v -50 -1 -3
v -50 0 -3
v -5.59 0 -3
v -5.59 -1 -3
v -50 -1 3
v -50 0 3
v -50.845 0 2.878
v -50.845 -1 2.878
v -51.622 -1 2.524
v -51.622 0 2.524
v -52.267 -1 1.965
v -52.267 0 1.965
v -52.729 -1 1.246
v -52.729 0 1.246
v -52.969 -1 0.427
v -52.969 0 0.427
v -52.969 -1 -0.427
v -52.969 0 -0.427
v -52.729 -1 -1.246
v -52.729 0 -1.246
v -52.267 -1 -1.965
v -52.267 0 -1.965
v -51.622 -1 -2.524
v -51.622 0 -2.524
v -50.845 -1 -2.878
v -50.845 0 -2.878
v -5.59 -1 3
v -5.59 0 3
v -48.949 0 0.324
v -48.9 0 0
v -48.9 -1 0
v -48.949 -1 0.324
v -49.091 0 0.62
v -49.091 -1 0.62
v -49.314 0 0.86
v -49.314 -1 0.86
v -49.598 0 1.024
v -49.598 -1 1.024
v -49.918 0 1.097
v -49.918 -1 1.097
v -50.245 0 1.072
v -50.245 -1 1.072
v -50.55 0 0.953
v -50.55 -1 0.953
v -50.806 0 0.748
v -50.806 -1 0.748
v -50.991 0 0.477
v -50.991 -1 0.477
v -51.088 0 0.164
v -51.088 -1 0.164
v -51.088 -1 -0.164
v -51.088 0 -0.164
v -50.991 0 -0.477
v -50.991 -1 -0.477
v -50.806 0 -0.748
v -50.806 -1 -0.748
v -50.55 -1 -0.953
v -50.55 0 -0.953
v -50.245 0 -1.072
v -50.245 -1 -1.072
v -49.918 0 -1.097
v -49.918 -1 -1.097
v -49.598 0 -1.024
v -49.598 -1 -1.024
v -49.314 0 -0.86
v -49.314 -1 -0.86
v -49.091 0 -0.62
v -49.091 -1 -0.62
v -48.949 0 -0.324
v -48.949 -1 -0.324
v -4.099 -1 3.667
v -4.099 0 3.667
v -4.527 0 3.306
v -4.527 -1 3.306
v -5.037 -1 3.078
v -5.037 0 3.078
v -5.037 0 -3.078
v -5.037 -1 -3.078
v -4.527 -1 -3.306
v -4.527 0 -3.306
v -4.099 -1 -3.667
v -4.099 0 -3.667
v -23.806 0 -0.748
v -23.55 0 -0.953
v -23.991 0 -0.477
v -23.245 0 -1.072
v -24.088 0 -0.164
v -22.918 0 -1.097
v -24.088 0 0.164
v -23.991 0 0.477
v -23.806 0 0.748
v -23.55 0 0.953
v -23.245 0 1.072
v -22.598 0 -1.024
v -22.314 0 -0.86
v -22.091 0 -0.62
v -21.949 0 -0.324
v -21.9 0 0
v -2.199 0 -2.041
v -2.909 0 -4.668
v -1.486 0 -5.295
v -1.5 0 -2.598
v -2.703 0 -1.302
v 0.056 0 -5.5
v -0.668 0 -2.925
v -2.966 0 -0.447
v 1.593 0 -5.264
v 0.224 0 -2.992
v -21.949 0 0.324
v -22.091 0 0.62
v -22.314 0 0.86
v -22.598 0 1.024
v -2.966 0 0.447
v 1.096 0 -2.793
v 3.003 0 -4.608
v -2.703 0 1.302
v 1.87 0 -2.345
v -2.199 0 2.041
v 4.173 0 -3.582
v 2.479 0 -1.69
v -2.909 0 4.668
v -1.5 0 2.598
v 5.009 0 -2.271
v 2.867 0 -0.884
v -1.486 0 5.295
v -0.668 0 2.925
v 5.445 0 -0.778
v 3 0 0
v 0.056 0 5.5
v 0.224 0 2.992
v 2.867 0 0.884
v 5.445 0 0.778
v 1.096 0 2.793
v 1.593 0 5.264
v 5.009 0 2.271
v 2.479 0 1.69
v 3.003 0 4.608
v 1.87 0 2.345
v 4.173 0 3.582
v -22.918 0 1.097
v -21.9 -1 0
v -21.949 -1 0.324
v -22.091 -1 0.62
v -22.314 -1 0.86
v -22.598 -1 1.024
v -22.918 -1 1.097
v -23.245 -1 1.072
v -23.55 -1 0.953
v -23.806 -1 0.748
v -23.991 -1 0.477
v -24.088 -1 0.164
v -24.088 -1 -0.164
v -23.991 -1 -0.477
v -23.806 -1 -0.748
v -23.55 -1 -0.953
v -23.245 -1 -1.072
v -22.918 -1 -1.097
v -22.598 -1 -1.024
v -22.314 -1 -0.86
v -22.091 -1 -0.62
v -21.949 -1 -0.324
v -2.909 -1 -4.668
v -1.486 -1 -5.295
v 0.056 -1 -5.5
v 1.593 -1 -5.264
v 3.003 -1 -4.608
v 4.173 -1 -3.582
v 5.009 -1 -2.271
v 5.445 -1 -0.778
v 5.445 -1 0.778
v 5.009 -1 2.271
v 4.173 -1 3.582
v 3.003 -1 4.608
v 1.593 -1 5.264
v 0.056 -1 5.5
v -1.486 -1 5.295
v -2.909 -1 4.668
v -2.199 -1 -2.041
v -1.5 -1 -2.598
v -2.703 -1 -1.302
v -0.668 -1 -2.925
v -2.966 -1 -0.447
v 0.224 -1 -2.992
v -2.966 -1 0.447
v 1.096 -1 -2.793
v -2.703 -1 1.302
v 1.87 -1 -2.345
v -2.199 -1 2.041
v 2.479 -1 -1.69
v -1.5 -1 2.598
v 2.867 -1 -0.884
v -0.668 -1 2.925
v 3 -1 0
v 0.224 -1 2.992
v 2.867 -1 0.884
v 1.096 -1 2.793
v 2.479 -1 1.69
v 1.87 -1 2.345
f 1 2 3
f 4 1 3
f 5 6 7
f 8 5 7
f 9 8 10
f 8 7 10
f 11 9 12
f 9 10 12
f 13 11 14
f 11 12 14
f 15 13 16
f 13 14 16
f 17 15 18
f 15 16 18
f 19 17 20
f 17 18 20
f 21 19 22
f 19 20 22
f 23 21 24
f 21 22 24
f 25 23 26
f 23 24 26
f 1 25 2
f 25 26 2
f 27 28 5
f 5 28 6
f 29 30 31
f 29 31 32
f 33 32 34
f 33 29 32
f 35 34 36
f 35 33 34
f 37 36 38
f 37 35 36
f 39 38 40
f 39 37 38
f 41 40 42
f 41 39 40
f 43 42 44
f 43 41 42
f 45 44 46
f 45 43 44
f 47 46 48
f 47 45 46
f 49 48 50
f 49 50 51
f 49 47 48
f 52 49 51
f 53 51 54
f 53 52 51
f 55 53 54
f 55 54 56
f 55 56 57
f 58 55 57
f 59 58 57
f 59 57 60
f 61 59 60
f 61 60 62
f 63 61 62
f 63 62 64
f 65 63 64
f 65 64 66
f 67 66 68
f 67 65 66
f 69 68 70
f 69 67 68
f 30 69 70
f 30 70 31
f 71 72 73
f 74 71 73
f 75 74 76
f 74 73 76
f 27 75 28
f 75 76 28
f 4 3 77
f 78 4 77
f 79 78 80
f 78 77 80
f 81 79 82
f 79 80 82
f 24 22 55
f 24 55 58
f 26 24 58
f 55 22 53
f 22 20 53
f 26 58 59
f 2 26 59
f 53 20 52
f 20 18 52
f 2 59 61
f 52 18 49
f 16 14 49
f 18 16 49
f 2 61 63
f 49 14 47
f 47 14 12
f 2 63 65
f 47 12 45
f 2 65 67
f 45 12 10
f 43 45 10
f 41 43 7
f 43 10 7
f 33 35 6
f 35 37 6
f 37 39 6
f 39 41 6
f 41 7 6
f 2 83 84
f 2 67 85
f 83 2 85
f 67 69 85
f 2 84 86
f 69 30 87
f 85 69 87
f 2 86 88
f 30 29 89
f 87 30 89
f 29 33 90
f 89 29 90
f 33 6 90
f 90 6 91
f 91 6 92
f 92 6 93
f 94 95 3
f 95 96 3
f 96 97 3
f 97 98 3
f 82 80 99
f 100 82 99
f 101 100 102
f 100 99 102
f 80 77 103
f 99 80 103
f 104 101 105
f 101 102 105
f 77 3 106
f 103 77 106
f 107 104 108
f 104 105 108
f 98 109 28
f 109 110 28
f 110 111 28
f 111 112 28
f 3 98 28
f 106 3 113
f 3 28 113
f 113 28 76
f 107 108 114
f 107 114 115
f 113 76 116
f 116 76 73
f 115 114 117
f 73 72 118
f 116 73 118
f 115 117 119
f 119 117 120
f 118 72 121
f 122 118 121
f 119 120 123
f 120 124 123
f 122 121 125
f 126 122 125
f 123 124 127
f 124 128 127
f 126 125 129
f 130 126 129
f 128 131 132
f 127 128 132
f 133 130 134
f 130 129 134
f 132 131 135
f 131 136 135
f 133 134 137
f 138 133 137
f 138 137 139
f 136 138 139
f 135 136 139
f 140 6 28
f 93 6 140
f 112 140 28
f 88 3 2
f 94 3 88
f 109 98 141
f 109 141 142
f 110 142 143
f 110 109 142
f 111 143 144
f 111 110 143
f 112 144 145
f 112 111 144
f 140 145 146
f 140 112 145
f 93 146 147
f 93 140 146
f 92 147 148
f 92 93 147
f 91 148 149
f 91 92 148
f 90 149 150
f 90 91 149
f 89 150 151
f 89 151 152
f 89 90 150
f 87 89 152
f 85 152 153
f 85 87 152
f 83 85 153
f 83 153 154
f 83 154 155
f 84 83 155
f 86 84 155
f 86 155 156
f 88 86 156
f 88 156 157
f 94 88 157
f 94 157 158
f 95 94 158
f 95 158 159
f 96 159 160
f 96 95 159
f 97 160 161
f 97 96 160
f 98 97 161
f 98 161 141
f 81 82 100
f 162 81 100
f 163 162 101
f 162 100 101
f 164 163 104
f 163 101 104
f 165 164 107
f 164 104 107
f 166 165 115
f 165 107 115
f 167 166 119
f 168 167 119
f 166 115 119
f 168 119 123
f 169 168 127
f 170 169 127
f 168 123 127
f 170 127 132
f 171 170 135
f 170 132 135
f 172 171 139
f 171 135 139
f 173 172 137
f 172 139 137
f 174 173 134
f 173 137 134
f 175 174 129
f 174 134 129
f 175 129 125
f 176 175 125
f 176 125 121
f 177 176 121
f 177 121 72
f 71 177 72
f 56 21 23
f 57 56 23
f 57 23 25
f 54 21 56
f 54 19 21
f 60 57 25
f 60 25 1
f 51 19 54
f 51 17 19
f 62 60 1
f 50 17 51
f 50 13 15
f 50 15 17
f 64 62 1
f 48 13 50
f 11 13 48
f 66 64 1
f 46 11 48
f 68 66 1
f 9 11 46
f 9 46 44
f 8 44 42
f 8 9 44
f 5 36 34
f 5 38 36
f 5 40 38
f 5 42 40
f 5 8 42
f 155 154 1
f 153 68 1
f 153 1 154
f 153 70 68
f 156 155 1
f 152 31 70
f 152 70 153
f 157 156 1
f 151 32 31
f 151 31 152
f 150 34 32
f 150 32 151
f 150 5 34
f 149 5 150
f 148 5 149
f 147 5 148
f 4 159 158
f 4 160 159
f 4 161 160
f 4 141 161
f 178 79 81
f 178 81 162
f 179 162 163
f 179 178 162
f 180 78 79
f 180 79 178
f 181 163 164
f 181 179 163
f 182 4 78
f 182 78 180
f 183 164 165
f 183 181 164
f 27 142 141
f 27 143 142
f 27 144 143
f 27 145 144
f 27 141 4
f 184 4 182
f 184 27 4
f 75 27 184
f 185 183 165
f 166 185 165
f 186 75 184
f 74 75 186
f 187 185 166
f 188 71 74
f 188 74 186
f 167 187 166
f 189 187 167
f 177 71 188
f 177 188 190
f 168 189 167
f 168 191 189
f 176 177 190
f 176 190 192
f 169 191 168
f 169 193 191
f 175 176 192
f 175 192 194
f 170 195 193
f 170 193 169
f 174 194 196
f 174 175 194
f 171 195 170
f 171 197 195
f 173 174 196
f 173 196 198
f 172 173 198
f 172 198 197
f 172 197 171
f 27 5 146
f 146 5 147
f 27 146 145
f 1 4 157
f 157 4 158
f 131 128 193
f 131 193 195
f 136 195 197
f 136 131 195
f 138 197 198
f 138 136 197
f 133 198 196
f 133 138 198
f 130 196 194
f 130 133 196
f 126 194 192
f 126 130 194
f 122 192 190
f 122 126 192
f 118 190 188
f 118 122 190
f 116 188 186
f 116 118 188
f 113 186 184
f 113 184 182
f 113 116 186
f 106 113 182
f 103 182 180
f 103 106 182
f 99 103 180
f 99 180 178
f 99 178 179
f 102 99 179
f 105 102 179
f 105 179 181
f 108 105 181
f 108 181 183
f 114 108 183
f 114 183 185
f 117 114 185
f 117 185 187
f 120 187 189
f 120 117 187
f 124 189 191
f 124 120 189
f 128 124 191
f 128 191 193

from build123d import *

# Parameters (mm, degrees)
F0_R     = 1.1
F0_R_2   = 3
F1_DEPTH = 1


with BuildPart() as f1:
    # F0 (on Front) → F1 (new body)
    with BuildSketch(Plane.XZ):
        with BuildLine():
            ThreePointArc((-5.59017, -3), (-4.773673, -3.174258), (-4.099458, -3.666667))
            ThreePointArc((-4.099458, -3.666667), (5.5, 0), (-4.099458, 3.666667))
            ThreePointArc((-4.099458, 3.666667), (-4.773673, 3.174258), (-5.59017, 3))
            Line((-5.59017, 3), (-50, 3))
            ThreePointArc((-50, 3), (-53, 0), (-50, -3))
            Line((-50, -3), (-5.59017, -3))
        make_face()
        with Locations((-50, 0)):
            Circle(F0_R, mode=Mode.SUBTRACT)
        with Locations((-23, 0)):
            Circle(F0_R, mode=Mode.SUBTRACT)
        Circle(F0_R_2, mode=Mode.SUBTRACT)
    extrude(amount=F1_DEPTH)


solid = f1.part
